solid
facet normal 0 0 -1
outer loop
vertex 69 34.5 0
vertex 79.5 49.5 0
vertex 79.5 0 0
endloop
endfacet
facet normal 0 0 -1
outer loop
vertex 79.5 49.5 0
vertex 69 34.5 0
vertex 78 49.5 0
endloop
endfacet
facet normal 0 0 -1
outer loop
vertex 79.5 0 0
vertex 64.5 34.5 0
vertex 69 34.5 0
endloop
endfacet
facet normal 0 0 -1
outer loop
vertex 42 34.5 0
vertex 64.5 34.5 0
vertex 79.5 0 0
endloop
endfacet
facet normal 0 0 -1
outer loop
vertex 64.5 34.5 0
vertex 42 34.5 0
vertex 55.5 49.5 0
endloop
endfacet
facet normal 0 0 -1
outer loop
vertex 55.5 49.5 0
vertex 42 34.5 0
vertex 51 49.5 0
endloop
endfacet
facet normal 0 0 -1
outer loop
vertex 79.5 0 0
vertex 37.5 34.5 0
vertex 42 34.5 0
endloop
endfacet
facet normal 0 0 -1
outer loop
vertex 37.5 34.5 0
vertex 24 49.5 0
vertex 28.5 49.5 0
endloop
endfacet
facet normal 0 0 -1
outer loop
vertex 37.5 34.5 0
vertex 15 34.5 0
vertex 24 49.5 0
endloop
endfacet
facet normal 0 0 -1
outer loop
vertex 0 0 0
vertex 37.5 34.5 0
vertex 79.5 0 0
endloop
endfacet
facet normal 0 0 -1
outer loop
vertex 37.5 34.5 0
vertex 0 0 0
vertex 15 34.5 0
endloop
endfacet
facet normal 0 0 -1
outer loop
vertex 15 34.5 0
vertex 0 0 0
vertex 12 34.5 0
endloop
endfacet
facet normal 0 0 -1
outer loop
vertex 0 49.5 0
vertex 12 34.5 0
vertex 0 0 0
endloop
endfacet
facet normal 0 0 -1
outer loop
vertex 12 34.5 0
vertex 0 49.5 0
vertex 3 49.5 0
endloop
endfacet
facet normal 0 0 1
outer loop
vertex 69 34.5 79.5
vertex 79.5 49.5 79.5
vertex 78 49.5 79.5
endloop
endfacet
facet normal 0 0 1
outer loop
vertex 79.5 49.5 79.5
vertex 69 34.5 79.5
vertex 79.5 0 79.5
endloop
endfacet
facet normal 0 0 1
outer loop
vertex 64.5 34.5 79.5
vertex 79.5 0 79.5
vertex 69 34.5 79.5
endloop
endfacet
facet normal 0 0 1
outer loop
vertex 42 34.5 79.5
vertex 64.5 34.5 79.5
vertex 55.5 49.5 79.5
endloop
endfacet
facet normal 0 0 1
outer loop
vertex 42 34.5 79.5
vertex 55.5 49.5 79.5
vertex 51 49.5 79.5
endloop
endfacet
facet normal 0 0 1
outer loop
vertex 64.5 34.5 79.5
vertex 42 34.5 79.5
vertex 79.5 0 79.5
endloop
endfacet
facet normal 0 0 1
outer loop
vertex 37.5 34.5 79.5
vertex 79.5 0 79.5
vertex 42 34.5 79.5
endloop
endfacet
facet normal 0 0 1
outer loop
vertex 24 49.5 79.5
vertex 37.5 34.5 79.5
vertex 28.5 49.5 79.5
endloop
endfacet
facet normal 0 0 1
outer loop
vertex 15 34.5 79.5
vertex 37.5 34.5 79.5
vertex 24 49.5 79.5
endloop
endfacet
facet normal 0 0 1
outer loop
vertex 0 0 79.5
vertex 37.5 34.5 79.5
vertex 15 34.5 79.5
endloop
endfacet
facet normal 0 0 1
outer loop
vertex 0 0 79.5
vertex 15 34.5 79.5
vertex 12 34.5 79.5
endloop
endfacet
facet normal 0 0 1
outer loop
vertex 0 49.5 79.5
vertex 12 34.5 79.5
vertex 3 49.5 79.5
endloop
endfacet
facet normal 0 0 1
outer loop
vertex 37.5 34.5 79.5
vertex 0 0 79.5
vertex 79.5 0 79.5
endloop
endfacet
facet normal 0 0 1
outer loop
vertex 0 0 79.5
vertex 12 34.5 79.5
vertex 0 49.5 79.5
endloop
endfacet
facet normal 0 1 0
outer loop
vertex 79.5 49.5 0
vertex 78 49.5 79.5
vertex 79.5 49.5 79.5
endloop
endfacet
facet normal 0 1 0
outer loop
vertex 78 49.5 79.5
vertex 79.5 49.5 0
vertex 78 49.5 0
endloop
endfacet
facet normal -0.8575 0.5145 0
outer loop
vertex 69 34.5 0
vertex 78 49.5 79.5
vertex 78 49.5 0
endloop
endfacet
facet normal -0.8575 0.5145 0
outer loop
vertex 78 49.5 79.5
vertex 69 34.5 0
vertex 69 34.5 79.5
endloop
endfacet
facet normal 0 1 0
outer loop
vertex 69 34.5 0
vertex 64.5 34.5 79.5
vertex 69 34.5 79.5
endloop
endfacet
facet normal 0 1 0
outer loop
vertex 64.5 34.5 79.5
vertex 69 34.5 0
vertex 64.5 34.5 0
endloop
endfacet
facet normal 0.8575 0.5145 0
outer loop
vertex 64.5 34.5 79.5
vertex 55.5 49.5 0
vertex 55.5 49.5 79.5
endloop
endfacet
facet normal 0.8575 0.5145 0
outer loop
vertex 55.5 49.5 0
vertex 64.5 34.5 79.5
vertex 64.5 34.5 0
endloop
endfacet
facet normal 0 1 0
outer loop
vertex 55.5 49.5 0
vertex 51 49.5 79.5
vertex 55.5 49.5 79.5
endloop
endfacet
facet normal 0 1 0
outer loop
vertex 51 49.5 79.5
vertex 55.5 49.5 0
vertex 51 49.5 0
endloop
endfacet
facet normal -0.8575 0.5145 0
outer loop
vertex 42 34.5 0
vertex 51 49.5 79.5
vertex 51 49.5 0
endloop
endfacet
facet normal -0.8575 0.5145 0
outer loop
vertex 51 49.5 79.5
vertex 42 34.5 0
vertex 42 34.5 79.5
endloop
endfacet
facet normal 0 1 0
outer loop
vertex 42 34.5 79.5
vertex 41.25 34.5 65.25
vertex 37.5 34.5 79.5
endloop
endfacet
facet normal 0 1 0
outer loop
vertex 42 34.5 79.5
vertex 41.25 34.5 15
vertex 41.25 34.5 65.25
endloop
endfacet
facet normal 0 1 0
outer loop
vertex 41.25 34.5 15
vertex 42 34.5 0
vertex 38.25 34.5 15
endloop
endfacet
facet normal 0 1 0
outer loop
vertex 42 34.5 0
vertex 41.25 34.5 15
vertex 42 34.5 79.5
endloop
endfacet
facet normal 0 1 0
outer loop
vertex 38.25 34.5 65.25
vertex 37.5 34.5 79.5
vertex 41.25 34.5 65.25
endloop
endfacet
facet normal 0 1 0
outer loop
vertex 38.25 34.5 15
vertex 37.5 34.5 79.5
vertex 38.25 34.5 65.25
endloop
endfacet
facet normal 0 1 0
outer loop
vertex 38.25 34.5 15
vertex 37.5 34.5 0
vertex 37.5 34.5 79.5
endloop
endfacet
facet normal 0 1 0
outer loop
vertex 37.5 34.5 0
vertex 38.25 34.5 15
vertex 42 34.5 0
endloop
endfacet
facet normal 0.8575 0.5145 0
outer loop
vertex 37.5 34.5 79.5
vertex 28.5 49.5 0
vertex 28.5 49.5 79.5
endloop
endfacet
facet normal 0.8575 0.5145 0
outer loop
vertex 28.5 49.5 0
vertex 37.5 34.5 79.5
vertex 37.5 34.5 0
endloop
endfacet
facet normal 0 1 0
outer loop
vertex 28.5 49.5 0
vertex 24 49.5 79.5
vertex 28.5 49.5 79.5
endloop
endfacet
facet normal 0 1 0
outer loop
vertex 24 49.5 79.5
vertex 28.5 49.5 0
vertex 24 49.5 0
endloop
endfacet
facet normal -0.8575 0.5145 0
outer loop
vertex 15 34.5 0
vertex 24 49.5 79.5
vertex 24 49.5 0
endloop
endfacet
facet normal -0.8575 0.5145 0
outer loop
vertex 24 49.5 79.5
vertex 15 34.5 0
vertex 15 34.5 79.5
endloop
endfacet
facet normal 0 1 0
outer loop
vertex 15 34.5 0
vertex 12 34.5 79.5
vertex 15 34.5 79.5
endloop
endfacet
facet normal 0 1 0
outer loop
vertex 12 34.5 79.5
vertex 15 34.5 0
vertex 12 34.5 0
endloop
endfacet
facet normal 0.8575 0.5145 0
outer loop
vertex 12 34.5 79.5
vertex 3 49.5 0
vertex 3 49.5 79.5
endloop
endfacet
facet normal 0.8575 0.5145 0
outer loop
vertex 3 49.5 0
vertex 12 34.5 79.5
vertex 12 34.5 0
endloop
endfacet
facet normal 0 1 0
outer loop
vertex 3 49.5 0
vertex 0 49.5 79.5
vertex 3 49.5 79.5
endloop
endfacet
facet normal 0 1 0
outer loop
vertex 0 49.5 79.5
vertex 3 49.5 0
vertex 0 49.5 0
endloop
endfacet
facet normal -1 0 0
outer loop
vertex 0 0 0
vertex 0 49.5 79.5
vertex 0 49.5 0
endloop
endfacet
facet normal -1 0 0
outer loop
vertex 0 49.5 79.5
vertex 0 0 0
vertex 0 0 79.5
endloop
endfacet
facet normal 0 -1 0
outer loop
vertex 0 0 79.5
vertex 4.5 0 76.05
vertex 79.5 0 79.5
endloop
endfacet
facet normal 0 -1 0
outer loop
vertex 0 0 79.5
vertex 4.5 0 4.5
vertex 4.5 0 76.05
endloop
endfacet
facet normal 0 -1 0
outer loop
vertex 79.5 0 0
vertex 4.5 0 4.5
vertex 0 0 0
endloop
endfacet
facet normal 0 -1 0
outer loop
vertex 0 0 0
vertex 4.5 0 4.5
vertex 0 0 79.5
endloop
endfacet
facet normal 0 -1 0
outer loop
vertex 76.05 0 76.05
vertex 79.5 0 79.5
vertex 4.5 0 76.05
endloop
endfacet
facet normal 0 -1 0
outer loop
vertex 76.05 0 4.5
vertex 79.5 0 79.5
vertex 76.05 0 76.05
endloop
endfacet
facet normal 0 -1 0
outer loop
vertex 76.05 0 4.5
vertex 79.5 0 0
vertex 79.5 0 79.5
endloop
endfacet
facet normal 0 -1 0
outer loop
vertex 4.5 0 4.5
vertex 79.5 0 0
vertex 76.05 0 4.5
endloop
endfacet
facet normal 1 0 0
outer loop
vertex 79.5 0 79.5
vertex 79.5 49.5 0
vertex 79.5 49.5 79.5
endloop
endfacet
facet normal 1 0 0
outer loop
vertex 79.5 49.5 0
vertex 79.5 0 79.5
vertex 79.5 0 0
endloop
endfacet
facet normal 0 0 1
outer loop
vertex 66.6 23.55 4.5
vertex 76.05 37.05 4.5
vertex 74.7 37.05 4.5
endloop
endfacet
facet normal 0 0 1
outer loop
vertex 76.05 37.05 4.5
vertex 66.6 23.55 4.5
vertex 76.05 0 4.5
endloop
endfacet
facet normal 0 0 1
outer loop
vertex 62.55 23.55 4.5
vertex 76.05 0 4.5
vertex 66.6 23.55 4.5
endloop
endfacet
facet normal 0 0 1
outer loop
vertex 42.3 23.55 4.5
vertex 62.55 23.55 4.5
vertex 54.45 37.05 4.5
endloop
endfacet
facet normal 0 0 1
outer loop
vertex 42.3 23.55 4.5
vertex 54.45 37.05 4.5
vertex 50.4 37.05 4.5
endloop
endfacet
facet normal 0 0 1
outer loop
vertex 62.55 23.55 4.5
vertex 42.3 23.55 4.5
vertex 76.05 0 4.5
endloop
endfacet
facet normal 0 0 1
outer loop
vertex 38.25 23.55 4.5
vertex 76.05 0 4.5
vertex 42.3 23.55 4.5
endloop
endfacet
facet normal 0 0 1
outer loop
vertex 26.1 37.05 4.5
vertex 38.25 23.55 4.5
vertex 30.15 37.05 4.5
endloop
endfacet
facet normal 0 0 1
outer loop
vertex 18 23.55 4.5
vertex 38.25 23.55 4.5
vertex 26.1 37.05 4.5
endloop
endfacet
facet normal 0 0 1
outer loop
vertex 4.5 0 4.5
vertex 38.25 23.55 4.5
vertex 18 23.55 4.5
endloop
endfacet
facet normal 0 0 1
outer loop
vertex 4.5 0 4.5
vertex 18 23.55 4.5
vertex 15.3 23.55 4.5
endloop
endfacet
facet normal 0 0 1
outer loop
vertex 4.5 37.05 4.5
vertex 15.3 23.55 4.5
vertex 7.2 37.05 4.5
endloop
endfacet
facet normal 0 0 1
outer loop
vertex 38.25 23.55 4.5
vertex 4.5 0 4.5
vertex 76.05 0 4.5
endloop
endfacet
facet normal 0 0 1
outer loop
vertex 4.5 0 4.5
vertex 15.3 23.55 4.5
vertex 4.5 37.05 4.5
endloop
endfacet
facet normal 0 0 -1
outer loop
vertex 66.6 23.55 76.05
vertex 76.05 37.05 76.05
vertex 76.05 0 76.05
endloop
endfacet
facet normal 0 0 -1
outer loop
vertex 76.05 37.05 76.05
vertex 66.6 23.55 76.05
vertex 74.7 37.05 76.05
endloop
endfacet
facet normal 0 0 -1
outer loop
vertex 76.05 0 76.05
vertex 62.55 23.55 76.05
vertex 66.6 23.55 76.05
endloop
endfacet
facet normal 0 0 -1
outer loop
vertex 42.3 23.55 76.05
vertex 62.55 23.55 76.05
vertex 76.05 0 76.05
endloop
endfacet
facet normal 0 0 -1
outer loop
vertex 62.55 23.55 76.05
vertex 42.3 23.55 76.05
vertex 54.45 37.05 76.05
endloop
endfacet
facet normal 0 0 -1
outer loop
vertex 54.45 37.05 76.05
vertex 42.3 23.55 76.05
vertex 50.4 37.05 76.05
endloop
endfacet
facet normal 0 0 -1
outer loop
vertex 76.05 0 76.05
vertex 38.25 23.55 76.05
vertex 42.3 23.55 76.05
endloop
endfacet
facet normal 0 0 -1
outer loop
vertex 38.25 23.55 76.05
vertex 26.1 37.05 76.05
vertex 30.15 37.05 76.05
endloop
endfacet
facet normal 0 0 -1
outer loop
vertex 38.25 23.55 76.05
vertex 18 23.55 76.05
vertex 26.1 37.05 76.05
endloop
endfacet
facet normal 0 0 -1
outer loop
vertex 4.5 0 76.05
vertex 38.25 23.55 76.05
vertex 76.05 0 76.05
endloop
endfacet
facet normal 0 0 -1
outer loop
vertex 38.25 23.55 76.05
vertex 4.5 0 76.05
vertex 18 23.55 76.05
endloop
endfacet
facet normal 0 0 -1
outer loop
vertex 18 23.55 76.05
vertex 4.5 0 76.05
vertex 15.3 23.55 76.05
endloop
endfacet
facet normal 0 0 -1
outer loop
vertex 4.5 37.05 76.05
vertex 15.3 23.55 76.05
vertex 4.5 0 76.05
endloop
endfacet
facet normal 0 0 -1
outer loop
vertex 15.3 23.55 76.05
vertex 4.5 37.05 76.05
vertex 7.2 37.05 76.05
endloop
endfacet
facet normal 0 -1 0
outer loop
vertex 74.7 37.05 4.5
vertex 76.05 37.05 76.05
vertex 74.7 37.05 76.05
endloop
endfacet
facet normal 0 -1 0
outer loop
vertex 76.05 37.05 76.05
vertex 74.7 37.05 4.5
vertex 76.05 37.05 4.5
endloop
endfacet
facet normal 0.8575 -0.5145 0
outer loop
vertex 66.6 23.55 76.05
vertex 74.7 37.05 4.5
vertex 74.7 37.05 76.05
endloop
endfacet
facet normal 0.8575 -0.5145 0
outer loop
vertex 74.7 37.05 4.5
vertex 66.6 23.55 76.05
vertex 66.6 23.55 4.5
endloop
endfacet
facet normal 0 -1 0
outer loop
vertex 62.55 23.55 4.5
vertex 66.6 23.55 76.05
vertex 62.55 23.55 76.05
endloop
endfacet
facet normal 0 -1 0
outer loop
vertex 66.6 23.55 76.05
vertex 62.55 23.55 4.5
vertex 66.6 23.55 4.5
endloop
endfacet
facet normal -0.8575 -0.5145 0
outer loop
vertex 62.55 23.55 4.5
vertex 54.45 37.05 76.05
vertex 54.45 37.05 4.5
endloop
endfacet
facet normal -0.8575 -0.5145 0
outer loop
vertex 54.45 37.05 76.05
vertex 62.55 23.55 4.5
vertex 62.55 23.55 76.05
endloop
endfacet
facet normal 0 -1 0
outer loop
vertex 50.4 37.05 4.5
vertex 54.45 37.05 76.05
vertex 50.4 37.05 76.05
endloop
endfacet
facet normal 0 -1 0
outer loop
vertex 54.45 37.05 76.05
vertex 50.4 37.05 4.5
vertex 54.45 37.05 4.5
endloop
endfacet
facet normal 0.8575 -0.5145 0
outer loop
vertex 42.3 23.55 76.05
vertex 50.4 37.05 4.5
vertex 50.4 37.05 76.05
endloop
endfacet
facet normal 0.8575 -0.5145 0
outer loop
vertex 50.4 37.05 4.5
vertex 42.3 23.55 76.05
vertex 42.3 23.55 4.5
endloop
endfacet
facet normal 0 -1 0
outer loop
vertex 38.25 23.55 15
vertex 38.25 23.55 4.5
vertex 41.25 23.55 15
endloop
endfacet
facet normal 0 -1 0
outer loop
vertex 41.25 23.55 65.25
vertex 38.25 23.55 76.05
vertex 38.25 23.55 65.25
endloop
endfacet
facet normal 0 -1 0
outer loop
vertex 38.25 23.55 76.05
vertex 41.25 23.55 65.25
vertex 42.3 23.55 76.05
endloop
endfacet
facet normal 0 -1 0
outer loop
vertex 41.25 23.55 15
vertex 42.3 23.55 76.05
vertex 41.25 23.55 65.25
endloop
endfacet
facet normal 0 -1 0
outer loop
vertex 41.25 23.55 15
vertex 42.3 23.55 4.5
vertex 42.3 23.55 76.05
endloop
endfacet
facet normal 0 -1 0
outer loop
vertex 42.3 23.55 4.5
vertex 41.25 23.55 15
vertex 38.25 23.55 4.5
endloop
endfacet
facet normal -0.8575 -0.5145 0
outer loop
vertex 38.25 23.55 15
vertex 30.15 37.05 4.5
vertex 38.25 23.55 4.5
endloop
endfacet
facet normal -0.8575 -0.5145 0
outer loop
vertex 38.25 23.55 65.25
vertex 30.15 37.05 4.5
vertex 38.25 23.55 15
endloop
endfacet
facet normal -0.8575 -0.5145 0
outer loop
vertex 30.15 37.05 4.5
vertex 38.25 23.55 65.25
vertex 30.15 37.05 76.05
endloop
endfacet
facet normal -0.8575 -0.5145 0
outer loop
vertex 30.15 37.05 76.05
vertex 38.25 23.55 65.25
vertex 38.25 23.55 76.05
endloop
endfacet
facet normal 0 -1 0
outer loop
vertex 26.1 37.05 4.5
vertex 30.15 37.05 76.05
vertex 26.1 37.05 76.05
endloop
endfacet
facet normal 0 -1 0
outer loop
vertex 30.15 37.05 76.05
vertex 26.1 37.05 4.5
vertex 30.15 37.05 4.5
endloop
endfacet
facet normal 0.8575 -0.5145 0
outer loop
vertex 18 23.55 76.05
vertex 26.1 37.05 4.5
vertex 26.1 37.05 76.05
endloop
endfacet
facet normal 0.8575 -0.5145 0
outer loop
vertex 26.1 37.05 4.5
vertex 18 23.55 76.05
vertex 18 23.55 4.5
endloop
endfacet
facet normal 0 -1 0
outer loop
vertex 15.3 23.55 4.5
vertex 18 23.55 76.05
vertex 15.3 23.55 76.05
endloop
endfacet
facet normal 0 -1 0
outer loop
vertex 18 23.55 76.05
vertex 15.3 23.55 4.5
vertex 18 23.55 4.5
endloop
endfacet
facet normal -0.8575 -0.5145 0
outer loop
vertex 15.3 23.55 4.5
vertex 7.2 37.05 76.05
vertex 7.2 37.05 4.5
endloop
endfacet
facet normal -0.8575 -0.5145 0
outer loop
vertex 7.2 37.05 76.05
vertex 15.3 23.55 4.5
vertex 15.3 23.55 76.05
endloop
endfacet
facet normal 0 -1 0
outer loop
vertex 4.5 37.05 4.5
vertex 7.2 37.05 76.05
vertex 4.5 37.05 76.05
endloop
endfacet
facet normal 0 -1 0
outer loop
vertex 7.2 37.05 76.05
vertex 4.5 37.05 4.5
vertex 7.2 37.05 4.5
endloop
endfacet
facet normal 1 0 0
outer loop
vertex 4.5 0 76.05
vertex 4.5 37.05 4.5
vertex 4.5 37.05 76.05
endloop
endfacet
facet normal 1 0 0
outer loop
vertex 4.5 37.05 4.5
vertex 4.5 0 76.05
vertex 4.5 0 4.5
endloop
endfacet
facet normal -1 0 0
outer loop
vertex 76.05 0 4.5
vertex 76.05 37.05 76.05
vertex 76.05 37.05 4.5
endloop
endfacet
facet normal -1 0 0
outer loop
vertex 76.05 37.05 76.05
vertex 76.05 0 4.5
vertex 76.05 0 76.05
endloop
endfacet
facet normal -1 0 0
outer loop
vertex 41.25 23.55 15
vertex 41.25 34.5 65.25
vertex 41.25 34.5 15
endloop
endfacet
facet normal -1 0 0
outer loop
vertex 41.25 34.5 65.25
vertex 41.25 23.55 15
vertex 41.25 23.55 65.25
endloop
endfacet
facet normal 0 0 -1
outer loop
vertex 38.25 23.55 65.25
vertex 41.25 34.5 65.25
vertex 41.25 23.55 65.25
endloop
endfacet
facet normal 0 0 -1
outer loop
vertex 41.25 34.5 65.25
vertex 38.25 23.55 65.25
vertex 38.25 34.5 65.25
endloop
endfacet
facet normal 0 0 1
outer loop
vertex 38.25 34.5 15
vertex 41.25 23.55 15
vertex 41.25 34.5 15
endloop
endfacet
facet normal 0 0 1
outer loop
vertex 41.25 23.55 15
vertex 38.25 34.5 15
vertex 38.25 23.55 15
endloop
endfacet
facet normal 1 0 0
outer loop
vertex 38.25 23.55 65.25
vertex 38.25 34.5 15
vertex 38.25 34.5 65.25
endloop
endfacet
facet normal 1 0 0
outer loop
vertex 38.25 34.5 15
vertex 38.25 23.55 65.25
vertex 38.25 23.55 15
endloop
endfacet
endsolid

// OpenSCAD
scale([1.5,1.5,1.5]){
difference() {
difference() {
linear_extrude(height=53) path52();
translate([3,-5,3])scale([0.90,0.90,0.90])linear_extrude(height=53) path52();   
};
translate([25.5,10,10]) cube([2,100,33.5]);
};
}

module path52()
    polygon(
        points=
            [[0,33],[2,33],[8,23],[10,23],[16,33],[19,33],[25,23],[28,23],[34,33],[37,33],[43,23],[46,23],[52,33],[53,33],[53,0],[0,0]],
        paths=
            [[0, 1, 2, 3, 4, 5, 6, 7, 8, 9, 10, 11, 12, 13, 14, 15, 0]]
    );
